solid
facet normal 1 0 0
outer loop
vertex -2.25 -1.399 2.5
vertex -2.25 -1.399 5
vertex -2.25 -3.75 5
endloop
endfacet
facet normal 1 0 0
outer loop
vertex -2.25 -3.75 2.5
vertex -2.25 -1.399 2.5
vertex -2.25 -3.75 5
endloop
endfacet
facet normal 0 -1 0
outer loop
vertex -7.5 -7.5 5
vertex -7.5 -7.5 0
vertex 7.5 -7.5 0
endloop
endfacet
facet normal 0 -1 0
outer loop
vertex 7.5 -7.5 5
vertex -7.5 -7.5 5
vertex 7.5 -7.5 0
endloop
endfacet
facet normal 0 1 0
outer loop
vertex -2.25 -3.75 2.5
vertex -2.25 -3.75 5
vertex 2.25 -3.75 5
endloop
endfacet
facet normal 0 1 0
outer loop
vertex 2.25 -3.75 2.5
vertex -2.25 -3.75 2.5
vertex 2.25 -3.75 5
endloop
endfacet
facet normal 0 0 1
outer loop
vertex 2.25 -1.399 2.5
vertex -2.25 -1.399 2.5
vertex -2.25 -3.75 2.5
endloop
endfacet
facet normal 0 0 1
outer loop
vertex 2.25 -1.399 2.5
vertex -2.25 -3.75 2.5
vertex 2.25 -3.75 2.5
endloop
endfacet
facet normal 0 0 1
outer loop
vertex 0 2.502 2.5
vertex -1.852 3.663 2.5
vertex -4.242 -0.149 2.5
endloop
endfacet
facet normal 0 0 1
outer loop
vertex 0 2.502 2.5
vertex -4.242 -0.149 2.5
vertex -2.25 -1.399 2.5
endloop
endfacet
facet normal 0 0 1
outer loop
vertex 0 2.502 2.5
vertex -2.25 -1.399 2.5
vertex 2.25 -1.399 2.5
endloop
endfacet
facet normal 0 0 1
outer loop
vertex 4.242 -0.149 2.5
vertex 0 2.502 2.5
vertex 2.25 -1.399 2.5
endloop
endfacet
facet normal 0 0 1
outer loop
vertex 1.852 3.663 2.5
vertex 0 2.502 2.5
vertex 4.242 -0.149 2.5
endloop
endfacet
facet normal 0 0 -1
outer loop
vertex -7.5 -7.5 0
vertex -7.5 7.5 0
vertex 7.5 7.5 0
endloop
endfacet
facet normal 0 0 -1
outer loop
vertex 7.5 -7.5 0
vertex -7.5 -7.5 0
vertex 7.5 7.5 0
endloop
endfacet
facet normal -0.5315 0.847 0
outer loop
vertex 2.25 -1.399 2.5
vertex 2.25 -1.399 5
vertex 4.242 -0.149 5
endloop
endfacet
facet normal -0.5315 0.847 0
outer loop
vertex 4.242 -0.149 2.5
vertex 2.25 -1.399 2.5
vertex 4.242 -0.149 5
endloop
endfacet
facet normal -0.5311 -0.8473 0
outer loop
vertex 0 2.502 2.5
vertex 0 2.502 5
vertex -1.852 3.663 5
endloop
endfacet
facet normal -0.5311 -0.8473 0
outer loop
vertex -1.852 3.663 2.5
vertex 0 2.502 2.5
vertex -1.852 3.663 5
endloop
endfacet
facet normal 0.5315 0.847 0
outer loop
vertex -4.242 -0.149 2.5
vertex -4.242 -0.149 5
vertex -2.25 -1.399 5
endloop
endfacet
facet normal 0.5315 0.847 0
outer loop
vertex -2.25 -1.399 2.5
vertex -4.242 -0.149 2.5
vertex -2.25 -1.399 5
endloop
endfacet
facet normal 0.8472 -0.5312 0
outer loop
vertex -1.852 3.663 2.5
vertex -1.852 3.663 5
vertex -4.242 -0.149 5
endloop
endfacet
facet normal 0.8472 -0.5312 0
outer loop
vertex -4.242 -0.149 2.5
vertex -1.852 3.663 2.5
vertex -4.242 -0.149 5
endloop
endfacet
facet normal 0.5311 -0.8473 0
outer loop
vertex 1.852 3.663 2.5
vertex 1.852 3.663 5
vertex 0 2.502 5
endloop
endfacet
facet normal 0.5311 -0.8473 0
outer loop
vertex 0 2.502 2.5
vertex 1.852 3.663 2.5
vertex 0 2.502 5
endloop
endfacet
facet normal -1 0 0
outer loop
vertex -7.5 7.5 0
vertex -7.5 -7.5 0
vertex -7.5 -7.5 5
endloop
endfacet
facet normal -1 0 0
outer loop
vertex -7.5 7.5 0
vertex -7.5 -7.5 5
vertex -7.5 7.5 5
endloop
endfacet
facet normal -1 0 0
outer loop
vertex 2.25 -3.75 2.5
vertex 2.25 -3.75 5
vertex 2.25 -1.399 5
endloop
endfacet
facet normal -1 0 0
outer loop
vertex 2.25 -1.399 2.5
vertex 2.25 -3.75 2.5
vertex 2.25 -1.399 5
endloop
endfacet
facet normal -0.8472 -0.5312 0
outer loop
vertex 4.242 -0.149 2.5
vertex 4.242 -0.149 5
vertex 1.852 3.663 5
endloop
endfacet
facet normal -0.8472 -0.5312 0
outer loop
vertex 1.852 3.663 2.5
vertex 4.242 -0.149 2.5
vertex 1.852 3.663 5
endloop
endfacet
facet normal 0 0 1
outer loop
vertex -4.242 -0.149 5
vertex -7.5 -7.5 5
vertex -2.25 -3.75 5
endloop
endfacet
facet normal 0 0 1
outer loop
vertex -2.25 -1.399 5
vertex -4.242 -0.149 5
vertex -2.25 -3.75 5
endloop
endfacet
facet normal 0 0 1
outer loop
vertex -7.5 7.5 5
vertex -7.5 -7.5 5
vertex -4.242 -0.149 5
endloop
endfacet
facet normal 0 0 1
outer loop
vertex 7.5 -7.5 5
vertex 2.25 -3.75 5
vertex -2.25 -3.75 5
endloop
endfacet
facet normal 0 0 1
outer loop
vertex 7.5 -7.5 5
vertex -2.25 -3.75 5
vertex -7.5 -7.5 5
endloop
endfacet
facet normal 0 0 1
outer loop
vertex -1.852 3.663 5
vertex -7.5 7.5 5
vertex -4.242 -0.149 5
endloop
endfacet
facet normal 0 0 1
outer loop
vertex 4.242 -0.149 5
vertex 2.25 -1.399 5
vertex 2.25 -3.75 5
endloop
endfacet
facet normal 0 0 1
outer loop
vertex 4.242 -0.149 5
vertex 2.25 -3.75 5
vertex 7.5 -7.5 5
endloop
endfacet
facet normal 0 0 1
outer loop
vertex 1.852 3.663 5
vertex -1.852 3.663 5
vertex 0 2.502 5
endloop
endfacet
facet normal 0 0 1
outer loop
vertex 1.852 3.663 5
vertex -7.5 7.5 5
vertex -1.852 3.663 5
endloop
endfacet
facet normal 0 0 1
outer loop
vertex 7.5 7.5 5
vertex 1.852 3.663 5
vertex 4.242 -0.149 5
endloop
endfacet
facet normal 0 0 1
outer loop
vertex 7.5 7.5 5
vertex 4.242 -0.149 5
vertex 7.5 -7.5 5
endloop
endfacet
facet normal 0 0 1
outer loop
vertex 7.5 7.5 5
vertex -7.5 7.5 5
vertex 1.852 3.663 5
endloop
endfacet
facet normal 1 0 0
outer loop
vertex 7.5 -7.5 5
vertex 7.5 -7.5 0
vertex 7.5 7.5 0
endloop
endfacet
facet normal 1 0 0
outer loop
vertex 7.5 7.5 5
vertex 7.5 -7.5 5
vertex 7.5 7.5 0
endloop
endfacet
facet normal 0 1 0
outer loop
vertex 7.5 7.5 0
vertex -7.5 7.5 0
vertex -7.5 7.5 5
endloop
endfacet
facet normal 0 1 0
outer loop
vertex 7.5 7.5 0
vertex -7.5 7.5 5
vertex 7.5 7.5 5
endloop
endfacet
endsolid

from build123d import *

# Parameters (mm, degrees)
F0_W     = 15
F0_H     = 15
F1_DEPTH = 5
F3_DEPTH = 2.5


with BuildPart() as f1:
    # F0 (on Top) → F1 (new body)
    with BuildSketch(Plane.XY):
        Rectangle(F0_W, F0_H)
    extrude(amount=F1_DEPTH)

    # F2 (on face) → F3 (cut)
    with BuildSketch(Plane.XY.offset(5)):
        Polygon((0, 2.502102), (-1.851563, 3.663132), (-4.242188, -0.149336), (-2.25, -1.398546), (-2.25, -3.75), (2.25, -3.75), (2.25, -1.398546), (4.242187, -0.149336), (1.851562, 3.663132), align=None)
    extrude(amount=-F3_DEPTH, mode=Mode.SUBTRACT)


solid = f1.part
